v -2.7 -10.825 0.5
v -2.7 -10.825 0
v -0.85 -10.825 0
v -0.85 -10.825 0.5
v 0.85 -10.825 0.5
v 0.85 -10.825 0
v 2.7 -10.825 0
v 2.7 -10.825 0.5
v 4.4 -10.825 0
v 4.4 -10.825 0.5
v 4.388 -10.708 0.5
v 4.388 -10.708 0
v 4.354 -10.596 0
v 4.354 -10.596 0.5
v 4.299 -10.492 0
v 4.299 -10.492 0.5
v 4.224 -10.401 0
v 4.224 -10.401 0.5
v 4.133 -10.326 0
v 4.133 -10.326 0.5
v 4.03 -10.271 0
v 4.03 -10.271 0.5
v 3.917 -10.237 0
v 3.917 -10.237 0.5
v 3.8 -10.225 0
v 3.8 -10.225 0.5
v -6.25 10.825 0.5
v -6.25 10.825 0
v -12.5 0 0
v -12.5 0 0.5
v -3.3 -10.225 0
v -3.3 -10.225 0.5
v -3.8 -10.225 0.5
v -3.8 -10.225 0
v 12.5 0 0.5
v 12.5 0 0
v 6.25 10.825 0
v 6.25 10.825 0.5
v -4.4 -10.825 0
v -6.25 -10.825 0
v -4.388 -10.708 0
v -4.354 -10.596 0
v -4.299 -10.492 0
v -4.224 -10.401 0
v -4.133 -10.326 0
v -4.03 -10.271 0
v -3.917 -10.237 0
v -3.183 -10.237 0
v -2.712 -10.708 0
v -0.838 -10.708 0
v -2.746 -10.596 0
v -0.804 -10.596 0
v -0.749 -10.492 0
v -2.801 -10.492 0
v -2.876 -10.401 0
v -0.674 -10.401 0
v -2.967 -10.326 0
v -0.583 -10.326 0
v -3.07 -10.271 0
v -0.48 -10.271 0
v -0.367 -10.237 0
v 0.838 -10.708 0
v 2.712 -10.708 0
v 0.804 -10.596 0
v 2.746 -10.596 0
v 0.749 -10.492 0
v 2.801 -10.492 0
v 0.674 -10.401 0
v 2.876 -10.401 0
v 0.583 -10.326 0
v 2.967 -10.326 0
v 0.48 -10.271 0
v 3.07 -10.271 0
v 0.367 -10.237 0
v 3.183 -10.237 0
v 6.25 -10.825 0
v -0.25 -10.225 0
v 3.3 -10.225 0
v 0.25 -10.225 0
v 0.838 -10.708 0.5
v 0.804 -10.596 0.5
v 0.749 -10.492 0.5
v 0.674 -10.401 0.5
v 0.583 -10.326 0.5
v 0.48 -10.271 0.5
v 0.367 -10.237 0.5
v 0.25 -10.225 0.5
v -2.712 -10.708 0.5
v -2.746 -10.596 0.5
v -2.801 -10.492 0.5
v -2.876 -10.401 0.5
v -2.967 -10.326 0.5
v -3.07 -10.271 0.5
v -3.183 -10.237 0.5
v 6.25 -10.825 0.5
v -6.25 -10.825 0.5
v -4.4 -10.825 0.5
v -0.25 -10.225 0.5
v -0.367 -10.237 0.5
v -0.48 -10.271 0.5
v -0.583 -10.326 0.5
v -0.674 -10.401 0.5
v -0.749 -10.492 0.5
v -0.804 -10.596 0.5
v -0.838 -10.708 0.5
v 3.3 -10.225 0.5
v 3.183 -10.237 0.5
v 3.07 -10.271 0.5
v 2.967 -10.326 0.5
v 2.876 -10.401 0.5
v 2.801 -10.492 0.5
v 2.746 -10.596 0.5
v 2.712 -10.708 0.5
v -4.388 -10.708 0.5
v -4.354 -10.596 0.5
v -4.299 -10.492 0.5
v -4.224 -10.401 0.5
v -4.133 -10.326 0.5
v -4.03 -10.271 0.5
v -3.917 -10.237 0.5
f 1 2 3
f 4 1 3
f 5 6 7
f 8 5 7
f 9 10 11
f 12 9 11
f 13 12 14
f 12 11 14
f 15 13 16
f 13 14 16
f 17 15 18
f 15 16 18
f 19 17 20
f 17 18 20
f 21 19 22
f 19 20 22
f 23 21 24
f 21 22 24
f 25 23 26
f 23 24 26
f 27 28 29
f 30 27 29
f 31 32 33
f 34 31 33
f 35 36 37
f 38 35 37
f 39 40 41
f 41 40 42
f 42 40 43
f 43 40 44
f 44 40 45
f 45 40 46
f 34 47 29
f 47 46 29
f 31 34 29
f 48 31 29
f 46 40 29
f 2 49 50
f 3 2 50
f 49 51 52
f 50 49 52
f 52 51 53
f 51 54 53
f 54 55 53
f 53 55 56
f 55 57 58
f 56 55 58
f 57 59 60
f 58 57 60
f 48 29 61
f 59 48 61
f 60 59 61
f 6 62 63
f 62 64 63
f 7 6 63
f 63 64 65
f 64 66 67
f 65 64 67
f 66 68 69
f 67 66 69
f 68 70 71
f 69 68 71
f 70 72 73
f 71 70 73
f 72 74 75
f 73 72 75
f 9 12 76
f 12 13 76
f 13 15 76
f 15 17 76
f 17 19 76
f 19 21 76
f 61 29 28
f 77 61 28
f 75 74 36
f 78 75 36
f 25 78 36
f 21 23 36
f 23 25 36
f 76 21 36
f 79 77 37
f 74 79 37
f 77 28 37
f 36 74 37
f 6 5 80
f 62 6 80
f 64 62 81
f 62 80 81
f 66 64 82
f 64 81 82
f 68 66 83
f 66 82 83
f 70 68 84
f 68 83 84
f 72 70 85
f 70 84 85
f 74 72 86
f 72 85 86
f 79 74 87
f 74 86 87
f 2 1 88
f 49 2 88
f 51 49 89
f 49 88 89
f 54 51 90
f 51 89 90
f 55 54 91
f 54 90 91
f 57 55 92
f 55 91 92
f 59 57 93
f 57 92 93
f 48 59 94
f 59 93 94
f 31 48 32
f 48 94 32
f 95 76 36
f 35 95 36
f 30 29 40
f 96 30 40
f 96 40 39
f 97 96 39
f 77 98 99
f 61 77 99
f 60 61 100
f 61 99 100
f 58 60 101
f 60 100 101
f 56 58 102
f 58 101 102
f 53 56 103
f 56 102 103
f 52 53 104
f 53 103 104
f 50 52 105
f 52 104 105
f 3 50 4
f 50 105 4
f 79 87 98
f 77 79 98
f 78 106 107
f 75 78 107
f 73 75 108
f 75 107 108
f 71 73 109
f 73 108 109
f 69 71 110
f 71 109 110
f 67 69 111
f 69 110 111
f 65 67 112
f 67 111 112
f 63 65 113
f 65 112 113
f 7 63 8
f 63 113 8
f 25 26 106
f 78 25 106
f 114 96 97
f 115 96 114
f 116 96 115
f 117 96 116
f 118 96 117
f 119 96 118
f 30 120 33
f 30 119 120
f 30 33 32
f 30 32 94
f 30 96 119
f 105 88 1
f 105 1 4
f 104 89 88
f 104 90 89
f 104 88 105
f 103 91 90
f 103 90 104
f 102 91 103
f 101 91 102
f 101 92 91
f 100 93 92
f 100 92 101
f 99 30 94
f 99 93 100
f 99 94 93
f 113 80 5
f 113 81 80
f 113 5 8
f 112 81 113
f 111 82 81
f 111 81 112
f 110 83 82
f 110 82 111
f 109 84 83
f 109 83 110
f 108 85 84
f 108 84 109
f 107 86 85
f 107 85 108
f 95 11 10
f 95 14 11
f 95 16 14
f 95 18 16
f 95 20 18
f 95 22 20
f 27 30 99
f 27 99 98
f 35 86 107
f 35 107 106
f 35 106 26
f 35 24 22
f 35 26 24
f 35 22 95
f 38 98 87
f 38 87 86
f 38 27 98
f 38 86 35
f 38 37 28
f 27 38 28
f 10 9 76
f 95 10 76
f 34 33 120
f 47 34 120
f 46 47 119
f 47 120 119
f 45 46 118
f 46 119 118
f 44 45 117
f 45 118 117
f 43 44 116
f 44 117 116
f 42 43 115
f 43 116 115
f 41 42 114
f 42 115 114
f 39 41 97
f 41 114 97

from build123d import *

# Parameters (mm, degrees)
F1_DEPTH = 0.5
F3_DEPTH = 0.501


with BuildPart() as f1:
    # F0 (on Top) → F1 (new body)
    with BuildSketch(Plane.XY):
        Polygon((6.25, -10.825318), (12.5, 0), (6.25, 10.825318), (-6.25, 10.825318), (-12.5, 0), (-6.25, -10.825318), align=None)
    extrude(amount=F1_DEPTH)

    # F2 (on face) → F3 (cut, through all)
    with BuildSketch(Plane.XY.offset(0.5)):
        with BuildLine():
            ThreePointArc((4.4, -10.825318), (4.224264, -10.401053), (3.8, -10.225318))
            Line((3.8, -10.225318), (3.3, -10.225318))
            ThreePointArc((3.3, -10.225318), (2.875736, -10.401053), (2.7, -10.825318))
            Line((2.7, -10.825318), (4.4, -10.825318))
        make_face()
        with BuildLine():
            ThreePointArc((0.85, -10.825318), (0.674264, -10.401053), (0.25, -10.225318))
            Line((0.25, -10.225318), (-0.25, -10.225318))
            ThreePointArc((-0.25, -10.225318), (-0.674264, -10.401053), (-0.85, -10.825318))
            Line((-0.85, -10.825318), (0.85, -10.825318))
        make_face()
        with BuildLine():
            ThreePointArc((-2.7, -10.825318), (-2.875736, -10.401053), (-3.3, -10.225318))
            Line((-3.3, -10.225318), (-3.8, -10.225318))
            ThreePointArc((-3.8, -10.225318), (-4.224264, -10.401053), (-4.4, -10.825318))
            Line((-4.4, -10.825318), (-2.7, -10.825318))
        make_face()
    extrude(amount=-F3_DEPTH, mode=Mode.SUBTRACT)


solid = f1.part
